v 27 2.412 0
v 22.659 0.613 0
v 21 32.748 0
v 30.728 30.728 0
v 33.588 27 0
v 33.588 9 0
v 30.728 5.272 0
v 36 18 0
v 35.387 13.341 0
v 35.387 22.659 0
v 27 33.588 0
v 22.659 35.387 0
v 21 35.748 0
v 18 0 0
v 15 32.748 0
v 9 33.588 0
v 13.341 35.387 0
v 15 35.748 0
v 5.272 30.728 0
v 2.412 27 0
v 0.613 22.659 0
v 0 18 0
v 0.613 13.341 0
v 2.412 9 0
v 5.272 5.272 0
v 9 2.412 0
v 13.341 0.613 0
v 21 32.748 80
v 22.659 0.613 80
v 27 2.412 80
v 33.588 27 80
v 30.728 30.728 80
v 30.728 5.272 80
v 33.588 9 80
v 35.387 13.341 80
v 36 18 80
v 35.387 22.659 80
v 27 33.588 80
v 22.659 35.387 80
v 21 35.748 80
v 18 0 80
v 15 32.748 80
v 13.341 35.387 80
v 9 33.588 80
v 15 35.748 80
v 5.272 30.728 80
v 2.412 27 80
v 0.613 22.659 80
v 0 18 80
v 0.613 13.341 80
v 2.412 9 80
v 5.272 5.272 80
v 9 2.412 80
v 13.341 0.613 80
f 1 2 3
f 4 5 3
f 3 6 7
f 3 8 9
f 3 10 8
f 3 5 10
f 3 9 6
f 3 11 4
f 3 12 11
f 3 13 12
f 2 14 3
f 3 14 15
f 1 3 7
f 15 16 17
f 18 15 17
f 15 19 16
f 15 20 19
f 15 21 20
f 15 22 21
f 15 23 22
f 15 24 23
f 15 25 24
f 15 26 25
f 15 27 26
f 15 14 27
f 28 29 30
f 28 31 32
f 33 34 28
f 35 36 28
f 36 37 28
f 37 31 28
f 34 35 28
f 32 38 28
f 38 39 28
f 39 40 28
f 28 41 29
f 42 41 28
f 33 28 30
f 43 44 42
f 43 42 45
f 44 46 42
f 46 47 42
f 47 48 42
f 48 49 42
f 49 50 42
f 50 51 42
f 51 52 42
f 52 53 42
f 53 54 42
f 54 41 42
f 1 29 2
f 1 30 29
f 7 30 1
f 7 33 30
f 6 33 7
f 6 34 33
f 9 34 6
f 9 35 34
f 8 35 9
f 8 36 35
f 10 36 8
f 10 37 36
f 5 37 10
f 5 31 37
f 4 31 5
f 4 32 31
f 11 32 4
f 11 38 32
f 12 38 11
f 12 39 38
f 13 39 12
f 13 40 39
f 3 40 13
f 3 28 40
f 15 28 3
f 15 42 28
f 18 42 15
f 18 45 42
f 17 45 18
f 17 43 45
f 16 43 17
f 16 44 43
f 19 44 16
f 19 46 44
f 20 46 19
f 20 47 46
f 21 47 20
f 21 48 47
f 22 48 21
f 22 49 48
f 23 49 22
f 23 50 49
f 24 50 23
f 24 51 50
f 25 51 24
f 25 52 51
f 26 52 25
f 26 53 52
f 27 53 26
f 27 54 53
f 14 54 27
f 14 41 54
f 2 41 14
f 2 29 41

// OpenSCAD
$fn = 32;

// ----------------------------------------------------------------------
// Keyway shaft: d36 shaft, key 6 x 3 mm
// ----------------------------------------------------------------------

// --- parameters (mm) ---
shaft_r = 18;             // shaft radius
key_w = 6;                // keyway width
key_d = 3;                // keyway depth below the surface line
plate_t = 80;             // shaft length, Z (extrusion height)

shaft_d = 2 * shaft_r;  // shaft diameter
circle_step = 15;  // polygon sampling step, degrees

profile = [[13.341, 35.387], [9, 33.588], [5.272, 30.728], [2.412, 27], [0.613, 22.659], [0, 18], [0.613, 13.341], [2.412, 9], [5.272, 5.272], [9, 2.412], [13.341, 0.613], [18, 0], [22.659, 0.613], [27, 2.412], [30.728, 5.272], [33.588, 9], [35.387, 13.341], [36, 18], [35.387, 22.659], [33.588, 27], [30.728, 30.728], [27, 33.588], [22.659, 35.387], [21, 35.748], [21, 32.748], [15, 32.748], [15, 35.748]];  // primary outline, 27 points, counter clockwise

// --- the one profile operation ---
linear_extrude(height = plate_t) polygon(points = profile);
